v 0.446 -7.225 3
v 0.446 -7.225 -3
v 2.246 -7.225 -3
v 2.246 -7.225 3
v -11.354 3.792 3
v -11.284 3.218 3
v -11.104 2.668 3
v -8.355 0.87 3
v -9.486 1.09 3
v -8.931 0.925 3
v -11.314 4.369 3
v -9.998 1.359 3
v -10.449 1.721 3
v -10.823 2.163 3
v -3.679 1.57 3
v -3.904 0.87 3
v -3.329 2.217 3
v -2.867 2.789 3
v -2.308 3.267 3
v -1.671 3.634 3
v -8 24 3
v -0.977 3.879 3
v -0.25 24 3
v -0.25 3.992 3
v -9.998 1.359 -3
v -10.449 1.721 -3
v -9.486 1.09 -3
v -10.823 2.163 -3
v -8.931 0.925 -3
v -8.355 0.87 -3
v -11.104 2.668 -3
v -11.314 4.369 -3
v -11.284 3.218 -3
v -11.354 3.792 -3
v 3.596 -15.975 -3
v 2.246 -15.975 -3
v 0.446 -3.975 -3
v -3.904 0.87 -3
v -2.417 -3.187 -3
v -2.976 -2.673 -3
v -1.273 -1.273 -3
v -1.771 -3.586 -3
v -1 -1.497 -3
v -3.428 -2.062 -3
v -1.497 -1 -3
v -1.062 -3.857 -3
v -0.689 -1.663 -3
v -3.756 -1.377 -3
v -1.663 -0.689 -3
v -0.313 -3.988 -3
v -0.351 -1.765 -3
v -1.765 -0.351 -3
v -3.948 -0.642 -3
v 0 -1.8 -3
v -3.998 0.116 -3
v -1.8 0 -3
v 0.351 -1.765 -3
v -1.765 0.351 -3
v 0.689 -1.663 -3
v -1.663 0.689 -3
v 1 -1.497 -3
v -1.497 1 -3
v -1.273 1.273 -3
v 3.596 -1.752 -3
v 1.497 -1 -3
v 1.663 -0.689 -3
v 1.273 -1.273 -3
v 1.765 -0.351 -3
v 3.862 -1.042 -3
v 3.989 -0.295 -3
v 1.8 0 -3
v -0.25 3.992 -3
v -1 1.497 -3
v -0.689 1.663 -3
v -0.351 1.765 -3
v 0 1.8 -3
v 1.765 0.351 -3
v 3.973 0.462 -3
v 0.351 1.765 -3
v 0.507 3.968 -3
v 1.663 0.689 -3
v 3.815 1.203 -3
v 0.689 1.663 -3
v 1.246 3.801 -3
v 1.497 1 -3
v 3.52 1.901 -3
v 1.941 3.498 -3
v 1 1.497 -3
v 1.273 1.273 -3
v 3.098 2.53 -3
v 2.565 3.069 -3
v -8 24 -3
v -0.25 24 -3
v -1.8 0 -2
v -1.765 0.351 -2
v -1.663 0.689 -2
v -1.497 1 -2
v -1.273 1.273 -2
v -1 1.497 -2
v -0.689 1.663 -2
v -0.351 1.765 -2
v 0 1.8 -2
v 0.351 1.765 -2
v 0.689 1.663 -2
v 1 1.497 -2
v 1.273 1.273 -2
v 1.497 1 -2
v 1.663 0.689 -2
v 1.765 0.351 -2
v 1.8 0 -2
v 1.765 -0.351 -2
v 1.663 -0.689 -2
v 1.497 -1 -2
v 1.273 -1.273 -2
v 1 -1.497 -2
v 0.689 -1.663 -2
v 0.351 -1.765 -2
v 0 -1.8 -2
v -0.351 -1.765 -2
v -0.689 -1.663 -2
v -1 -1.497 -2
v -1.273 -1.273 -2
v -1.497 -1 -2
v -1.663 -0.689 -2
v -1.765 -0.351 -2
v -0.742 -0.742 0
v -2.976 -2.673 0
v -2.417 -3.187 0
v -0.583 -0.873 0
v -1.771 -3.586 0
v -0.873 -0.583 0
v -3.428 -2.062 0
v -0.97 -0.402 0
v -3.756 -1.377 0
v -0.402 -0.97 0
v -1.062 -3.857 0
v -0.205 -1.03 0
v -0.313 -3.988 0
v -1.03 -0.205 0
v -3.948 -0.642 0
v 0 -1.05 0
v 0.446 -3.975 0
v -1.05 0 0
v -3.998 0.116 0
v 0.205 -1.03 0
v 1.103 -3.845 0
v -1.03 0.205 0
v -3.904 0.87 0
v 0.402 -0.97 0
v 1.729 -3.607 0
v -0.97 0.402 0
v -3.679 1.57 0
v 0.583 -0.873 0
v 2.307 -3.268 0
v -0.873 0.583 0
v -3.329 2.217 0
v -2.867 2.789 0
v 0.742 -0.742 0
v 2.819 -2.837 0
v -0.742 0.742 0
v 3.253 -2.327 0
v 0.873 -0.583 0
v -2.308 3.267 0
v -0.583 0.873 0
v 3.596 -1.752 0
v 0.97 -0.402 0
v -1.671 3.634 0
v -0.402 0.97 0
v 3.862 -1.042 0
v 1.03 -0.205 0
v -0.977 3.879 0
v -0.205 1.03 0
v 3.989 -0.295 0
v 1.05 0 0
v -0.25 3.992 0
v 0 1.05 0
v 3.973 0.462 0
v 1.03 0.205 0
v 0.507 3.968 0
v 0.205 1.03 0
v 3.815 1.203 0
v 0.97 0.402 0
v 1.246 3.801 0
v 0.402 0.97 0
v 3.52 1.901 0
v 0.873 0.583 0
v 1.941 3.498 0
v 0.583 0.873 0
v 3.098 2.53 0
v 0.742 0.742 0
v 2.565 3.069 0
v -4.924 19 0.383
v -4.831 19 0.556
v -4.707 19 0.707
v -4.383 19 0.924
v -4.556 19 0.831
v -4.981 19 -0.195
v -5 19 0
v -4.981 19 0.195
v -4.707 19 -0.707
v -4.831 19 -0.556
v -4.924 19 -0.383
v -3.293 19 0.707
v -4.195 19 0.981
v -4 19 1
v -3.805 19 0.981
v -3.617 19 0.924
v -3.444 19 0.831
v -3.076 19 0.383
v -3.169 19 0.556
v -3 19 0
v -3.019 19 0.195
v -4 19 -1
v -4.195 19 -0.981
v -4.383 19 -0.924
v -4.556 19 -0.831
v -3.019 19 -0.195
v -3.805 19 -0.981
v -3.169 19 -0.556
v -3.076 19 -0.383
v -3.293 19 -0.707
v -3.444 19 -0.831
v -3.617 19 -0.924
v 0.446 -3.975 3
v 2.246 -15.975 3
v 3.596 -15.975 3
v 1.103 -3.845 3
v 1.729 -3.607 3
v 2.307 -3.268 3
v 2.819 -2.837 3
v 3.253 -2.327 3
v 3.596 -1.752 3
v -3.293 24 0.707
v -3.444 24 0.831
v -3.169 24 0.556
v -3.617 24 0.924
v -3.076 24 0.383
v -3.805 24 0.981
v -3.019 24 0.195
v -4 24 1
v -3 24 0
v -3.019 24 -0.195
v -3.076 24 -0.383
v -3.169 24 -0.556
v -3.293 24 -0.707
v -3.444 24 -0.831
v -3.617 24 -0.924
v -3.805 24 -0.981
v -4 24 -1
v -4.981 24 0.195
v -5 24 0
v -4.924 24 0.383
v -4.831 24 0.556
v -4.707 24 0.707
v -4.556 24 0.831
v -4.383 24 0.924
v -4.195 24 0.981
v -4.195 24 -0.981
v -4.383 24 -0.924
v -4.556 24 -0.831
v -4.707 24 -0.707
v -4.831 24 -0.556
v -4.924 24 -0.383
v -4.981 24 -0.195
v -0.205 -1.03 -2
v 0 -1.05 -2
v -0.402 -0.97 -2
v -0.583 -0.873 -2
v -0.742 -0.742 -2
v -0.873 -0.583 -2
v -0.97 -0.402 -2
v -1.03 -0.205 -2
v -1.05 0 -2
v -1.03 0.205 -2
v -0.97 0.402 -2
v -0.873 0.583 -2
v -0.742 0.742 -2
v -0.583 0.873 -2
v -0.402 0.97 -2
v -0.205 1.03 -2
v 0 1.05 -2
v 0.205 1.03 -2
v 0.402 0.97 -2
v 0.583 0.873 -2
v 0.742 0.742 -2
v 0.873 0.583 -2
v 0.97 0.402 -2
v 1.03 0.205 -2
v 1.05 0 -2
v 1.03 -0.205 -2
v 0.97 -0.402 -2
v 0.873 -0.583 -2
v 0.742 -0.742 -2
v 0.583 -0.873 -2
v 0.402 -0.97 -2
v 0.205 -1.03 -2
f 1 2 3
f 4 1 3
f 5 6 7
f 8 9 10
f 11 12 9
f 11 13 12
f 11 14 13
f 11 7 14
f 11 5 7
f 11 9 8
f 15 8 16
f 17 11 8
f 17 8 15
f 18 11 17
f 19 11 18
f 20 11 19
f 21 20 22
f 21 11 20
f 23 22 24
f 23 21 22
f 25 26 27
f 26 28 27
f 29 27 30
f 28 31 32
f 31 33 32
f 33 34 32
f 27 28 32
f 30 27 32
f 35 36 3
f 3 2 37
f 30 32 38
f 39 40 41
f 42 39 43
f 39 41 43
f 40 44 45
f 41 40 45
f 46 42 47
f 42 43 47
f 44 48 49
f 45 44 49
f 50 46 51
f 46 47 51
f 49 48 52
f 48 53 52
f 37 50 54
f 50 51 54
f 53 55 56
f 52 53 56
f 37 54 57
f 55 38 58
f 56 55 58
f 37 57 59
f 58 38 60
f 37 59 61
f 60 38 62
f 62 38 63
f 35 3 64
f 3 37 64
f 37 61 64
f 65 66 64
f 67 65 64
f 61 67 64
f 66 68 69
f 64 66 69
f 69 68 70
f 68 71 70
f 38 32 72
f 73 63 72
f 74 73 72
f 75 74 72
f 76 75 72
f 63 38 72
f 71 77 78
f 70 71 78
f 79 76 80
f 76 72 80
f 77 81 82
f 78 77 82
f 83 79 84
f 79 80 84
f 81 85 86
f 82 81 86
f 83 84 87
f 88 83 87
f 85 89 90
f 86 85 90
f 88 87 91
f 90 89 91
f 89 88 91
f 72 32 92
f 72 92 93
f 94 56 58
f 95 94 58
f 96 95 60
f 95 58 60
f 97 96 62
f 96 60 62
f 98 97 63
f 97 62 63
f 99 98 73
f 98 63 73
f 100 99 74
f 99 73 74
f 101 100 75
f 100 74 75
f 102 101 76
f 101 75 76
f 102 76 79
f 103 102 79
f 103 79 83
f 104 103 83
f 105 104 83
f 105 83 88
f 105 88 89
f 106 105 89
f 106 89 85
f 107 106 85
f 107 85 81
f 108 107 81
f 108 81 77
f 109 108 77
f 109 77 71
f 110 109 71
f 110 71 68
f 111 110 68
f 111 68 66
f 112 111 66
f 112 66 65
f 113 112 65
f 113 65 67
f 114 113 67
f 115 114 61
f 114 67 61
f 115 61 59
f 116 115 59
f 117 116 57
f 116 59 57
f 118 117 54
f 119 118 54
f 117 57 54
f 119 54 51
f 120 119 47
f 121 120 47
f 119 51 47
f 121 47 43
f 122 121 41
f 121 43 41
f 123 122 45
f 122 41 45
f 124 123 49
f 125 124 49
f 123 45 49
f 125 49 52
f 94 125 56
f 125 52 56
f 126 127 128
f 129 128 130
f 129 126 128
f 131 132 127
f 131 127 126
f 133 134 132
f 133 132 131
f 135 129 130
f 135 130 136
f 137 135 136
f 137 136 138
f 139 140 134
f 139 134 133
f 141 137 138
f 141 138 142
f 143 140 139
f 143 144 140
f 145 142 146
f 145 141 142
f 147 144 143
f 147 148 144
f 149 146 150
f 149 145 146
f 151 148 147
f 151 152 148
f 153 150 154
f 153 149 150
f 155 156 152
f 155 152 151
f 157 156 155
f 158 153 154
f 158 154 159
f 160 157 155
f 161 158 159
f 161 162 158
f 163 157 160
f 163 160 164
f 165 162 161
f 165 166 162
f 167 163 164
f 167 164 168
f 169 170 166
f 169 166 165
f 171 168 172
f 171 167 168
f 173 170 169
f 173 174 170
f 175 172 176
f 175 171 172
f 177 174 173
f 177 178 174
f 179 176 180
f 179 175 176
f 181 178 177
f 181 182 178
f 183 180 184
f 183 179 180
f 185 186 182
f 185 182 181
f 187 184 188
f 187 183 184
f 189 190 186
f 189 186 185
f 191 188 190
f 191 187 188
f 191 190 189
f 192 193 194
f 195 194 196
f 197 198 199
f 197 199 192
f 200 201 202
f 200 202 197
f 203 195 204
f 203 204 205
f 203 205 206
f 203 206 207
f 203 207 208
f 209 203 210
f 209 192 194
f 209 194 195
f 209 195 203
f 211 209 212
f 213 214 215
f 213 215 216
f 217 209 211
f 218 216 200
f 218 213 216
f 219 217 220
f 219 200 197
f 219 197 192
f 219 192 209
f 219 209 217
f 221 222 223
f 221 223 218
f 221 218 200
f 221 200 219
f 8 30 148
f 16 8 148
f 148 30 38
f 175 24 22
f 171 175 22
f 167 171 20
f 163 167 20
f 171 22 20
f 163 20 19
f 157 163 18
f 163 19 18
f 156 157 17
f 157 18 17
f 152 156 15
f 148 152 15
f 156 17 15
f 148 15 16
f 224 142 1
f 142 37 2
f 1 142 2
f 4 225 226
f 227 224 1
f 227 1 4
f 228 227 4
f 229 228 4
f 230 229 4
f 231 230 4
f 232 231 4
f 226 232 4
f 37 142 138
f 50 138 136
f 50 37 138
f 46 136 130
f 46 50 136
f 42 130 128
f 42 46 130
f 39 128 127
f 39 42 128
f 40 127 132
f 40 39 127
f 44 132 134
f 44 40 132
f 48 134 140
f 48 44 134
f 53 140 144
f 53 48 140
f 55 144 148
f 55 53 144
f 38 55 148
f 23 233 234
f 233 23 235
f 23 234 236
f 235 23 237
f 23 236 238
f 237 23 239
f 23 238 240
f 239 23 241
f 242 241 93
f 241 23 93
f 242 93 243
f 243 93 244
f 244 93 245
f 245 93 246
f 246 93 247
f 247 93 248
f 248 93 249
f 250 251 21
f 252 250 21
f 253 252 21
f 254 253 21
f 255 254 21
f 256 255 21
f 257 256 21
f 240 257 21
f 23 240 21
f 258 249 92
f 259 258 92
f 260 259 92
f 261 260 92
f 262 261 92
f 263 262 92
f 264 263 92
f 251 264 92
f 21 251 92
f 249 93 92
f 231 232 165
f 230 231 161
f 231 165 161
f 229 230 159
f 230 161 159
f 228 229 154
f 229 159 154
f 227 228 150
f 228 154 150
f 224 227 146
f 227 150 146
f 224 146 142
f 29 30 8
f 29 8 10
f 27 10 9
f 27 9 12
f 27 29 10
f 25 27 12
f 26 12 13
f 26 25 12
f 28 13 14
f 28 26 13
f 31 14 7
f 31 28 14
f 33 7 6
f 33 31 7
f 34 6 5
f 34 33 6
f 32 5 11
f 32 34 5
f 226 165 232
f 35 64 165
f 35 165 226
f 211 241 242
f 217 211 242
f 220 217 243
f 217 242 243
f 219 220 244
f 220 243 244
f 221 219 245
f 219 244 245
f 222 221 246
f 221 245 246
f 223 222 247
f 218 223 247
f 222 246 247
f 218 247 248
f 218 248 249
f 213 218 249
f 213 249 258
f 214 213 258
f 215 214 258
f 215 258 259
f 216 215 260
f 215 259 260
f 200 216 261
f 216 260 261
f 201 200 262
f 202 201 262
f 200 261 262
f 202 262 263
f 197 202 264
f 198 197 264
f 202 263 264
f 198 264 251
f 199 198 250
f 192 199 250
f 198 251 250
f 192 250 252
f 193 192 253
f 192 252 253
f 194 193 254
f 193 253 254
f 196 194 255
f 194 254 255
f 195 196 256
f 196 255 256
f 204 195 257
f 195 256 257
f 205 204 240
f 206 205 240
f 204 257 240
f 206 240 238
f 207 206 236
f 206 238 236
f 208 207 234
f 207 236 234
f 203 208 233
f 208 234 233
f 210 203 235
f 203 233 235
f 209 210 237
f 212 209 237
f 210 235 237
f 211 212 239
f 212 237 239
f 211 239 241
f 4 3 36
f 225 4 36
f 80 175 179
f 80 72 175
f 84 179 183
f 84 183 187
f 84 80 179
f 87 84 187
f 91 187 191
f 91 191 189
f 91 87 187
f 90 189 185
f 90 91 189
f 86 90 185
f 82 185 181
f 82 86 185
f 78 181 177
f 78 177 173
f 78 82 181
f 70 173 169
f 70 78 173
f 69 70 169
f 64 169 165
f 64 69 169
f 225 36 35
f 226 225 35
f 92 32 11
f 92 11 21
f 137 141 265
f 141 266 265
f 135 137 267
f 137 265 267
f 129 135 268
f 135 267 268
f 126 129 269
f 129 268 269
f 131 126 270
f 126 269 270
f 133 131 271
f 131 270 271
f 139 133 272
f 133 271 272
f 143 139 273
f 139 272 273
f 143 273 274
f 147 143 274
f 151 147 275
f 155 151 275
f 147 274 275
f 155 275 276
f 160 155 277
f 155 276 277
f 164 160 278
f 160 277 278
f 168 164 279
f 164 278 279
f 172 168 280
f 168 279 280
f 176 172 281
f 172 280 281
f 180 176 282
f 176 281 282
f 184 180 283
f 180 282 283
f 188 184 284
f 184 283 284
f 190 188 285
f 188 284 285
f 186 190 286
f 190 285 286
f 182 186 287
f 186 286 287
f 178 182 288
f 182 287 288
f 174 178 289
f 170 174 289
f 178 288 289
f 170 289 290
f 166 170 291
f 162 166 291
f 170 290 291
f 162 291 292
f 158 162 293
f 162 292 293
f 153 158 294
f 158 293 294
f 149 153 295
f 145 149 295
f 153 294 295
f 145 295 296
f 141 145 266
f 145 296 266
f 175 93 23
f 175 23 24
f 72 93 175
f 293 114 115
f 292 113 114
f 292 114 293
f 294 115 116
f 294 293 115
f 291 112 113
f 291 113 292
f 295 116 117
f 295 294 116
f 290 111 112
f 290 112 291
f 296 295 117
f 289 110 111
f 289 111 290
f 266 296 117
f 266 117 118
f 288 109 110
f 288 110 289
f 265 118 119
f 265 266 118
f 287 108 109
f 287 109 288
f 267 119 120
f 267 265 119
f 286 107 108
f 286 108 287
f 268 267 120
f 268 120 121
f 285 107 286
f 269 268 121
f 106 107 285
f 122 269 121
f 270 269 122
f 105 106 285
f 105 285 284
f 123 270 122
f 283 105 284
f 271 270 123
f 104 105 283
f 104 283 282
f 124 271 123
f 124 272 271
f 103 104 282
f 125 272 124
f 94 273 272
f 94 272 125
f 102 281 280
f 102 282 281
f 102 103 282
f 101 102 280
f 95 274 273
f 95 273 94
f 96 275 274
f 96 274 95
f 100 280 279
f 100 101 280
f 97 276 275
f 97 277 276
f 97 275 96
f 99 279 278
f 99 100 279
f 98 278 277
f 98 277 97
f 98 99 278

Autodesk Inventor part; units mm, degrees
ref_plane "YZ Plane" through (0, 0, 0) normal (1, 0, 0) x (0, 1, 0)
ref_plane "XZ Plane" through (0, 0, 0) normal (0, 1, 0) x (-1, 0, 0)
ref_plane "XY Plane" through (0, 0, 0) normal (0, 0, 1) x (1, 0, 0)
sketch "Sketch1" plane through (0, 0, 0) normal (0, 0, 1) x (1, 0, 0)
  circle A0 centre (0, 0) radius 4
  line L0 (0, 24) -> (-8, 24)
  line L1 (0, 24) -> (0, 4)
  line L2 (-11.9043, 0.8695) -> (-3.9043, 0.8695)
  line L3 (-11.9043, 0.8695) -> (-8, 24)
  dimension "d9" = 6
  dimension "d0" = 8
  dimension "d6" = 8
  dimension "d94" = 20
  dimension "d95" = 8
extrude "Extrusion1" add sketch "Sketch1" along normal mid plane 6
sketch "Sketch2" plane through (0, 0, 3) normal (0, 0, 1) x (1, 0, 0)
  circle A0 centre (0, 0) radius 4
extrude "Extrusion2" cut sketch "Sketch2" against normal blind 3
sketch "Sketch4" plane through (-8, 24, 3) normal (0, 1, 0) x (1, 0, 0)
  line L0 (8, 6) -> (8, 0) projected
  line L1 (0, 0) -> (8, 6)
  line L2 (8, 0) -> (0, 0) projected
  line L3 (0, 6) -> (0, 0) projected
  line L4 (8, 0) -> (0, 6)
  circle A0 centre (4, 3) radius 1
  point P0 (8, 3)
  point P1 (3.2, 2.4)
  point P2 (3.2, 3.6)
  dimension "d9" = 6
  dimension "d17" = 2
  dimension "d93" = 1.2
extrude "Extrusion4" cut sketch "Sketch4" against normal blind 5 contours A0 L4 L1 | L1 L4 A0 | A0 L1 L4 | L1 A0 L4
sketch "Sketch8" plane through (0, 0, 0) normal (0, 0, 1) x (1, 0, 0)
  arc A0 (-3.9043, 0.8695) -> (0, 4) centre (0, 0) ccw projected
  dimension "d9" = 6
hole "Hole3" at (0, 0, 0) direction (0, 0, -1) diameter 2.1 end through all
sketch "Sketch9" plane through (0, 0, 0) normal (0, 0, 1) x (1, 0, 0)
  line L0 (0, 4) -> (0, 24) construction
  line L1 (0, 24) -> (-8, 24) construction
  line L2 (-3.2679, 22.7321) -> (-9.3121, 0.175) construction
  line L3 (-11.9043, 0.8695) -> (-3.9043, 0.8695) construction
  arc A0 (0, 4) -> (-3.9043, 0.8695) centre (0, 0) ccw construction
  arc A1 (-3.9043, 0.8695) -> (0, 4) centre (0, 0) ccw projected
  line L4 (0, 31.995) -> (0, -23.9701) construction
  arc A2 (-3.9043, 0.8695) -> (0, 4) centre (0, 0) ccw construction
  line L5 (0.446, -3.9751) -> (0.446, -10.9751)
  line L6 (3.846, -1.0991) -> (3.846, -15.9751)
  line L7 (0.446, -10.9751) -> (2.246, -10.9751)
  line L8 (2.246, -10.9751) -> (2.246, -15.9751)
  line L9 (2.246, -15.9751) -> (3.846, -15.9751)
  point P0 (0.446, -3.9751)
  dimension "d9" = 6
  dimension "d90" = 7
  dimension "d91" = 3.4
  dimension "d92" = 1.8
extrude "Extrusion5" add sketch "Sketch9" along normal mid plane 6
sketch "Sketch10" plane through (0, 0, -3) normal (0, 0, -1) x (-1, 0, 0)
  circle A0 centre (0, 0) radius 1.05 projected
  circle A1 centre (0, 0) radius 1.8
  dimension "d9" = 6
  dimension "d62" = 3.6
extrude "Extrusion6" cut sketch "Sketch10" against normal blind 1
fillet "Fillet2" radius 3 1 edges at (-11.9043, 0.8695, 0)
move faces "Move1" translate (-0.25, 0, 0) faces at (3.846, -11.0164, 0)
move faces "Move2" translate (-0.25, 0, 0) faces at (0, 17.3333, 0)
move faces "Move3" translate (0, 3.75, 0) faces at (1.646, -10.9751, 1)
properties part number "pliers" material "ABS Plastic"
